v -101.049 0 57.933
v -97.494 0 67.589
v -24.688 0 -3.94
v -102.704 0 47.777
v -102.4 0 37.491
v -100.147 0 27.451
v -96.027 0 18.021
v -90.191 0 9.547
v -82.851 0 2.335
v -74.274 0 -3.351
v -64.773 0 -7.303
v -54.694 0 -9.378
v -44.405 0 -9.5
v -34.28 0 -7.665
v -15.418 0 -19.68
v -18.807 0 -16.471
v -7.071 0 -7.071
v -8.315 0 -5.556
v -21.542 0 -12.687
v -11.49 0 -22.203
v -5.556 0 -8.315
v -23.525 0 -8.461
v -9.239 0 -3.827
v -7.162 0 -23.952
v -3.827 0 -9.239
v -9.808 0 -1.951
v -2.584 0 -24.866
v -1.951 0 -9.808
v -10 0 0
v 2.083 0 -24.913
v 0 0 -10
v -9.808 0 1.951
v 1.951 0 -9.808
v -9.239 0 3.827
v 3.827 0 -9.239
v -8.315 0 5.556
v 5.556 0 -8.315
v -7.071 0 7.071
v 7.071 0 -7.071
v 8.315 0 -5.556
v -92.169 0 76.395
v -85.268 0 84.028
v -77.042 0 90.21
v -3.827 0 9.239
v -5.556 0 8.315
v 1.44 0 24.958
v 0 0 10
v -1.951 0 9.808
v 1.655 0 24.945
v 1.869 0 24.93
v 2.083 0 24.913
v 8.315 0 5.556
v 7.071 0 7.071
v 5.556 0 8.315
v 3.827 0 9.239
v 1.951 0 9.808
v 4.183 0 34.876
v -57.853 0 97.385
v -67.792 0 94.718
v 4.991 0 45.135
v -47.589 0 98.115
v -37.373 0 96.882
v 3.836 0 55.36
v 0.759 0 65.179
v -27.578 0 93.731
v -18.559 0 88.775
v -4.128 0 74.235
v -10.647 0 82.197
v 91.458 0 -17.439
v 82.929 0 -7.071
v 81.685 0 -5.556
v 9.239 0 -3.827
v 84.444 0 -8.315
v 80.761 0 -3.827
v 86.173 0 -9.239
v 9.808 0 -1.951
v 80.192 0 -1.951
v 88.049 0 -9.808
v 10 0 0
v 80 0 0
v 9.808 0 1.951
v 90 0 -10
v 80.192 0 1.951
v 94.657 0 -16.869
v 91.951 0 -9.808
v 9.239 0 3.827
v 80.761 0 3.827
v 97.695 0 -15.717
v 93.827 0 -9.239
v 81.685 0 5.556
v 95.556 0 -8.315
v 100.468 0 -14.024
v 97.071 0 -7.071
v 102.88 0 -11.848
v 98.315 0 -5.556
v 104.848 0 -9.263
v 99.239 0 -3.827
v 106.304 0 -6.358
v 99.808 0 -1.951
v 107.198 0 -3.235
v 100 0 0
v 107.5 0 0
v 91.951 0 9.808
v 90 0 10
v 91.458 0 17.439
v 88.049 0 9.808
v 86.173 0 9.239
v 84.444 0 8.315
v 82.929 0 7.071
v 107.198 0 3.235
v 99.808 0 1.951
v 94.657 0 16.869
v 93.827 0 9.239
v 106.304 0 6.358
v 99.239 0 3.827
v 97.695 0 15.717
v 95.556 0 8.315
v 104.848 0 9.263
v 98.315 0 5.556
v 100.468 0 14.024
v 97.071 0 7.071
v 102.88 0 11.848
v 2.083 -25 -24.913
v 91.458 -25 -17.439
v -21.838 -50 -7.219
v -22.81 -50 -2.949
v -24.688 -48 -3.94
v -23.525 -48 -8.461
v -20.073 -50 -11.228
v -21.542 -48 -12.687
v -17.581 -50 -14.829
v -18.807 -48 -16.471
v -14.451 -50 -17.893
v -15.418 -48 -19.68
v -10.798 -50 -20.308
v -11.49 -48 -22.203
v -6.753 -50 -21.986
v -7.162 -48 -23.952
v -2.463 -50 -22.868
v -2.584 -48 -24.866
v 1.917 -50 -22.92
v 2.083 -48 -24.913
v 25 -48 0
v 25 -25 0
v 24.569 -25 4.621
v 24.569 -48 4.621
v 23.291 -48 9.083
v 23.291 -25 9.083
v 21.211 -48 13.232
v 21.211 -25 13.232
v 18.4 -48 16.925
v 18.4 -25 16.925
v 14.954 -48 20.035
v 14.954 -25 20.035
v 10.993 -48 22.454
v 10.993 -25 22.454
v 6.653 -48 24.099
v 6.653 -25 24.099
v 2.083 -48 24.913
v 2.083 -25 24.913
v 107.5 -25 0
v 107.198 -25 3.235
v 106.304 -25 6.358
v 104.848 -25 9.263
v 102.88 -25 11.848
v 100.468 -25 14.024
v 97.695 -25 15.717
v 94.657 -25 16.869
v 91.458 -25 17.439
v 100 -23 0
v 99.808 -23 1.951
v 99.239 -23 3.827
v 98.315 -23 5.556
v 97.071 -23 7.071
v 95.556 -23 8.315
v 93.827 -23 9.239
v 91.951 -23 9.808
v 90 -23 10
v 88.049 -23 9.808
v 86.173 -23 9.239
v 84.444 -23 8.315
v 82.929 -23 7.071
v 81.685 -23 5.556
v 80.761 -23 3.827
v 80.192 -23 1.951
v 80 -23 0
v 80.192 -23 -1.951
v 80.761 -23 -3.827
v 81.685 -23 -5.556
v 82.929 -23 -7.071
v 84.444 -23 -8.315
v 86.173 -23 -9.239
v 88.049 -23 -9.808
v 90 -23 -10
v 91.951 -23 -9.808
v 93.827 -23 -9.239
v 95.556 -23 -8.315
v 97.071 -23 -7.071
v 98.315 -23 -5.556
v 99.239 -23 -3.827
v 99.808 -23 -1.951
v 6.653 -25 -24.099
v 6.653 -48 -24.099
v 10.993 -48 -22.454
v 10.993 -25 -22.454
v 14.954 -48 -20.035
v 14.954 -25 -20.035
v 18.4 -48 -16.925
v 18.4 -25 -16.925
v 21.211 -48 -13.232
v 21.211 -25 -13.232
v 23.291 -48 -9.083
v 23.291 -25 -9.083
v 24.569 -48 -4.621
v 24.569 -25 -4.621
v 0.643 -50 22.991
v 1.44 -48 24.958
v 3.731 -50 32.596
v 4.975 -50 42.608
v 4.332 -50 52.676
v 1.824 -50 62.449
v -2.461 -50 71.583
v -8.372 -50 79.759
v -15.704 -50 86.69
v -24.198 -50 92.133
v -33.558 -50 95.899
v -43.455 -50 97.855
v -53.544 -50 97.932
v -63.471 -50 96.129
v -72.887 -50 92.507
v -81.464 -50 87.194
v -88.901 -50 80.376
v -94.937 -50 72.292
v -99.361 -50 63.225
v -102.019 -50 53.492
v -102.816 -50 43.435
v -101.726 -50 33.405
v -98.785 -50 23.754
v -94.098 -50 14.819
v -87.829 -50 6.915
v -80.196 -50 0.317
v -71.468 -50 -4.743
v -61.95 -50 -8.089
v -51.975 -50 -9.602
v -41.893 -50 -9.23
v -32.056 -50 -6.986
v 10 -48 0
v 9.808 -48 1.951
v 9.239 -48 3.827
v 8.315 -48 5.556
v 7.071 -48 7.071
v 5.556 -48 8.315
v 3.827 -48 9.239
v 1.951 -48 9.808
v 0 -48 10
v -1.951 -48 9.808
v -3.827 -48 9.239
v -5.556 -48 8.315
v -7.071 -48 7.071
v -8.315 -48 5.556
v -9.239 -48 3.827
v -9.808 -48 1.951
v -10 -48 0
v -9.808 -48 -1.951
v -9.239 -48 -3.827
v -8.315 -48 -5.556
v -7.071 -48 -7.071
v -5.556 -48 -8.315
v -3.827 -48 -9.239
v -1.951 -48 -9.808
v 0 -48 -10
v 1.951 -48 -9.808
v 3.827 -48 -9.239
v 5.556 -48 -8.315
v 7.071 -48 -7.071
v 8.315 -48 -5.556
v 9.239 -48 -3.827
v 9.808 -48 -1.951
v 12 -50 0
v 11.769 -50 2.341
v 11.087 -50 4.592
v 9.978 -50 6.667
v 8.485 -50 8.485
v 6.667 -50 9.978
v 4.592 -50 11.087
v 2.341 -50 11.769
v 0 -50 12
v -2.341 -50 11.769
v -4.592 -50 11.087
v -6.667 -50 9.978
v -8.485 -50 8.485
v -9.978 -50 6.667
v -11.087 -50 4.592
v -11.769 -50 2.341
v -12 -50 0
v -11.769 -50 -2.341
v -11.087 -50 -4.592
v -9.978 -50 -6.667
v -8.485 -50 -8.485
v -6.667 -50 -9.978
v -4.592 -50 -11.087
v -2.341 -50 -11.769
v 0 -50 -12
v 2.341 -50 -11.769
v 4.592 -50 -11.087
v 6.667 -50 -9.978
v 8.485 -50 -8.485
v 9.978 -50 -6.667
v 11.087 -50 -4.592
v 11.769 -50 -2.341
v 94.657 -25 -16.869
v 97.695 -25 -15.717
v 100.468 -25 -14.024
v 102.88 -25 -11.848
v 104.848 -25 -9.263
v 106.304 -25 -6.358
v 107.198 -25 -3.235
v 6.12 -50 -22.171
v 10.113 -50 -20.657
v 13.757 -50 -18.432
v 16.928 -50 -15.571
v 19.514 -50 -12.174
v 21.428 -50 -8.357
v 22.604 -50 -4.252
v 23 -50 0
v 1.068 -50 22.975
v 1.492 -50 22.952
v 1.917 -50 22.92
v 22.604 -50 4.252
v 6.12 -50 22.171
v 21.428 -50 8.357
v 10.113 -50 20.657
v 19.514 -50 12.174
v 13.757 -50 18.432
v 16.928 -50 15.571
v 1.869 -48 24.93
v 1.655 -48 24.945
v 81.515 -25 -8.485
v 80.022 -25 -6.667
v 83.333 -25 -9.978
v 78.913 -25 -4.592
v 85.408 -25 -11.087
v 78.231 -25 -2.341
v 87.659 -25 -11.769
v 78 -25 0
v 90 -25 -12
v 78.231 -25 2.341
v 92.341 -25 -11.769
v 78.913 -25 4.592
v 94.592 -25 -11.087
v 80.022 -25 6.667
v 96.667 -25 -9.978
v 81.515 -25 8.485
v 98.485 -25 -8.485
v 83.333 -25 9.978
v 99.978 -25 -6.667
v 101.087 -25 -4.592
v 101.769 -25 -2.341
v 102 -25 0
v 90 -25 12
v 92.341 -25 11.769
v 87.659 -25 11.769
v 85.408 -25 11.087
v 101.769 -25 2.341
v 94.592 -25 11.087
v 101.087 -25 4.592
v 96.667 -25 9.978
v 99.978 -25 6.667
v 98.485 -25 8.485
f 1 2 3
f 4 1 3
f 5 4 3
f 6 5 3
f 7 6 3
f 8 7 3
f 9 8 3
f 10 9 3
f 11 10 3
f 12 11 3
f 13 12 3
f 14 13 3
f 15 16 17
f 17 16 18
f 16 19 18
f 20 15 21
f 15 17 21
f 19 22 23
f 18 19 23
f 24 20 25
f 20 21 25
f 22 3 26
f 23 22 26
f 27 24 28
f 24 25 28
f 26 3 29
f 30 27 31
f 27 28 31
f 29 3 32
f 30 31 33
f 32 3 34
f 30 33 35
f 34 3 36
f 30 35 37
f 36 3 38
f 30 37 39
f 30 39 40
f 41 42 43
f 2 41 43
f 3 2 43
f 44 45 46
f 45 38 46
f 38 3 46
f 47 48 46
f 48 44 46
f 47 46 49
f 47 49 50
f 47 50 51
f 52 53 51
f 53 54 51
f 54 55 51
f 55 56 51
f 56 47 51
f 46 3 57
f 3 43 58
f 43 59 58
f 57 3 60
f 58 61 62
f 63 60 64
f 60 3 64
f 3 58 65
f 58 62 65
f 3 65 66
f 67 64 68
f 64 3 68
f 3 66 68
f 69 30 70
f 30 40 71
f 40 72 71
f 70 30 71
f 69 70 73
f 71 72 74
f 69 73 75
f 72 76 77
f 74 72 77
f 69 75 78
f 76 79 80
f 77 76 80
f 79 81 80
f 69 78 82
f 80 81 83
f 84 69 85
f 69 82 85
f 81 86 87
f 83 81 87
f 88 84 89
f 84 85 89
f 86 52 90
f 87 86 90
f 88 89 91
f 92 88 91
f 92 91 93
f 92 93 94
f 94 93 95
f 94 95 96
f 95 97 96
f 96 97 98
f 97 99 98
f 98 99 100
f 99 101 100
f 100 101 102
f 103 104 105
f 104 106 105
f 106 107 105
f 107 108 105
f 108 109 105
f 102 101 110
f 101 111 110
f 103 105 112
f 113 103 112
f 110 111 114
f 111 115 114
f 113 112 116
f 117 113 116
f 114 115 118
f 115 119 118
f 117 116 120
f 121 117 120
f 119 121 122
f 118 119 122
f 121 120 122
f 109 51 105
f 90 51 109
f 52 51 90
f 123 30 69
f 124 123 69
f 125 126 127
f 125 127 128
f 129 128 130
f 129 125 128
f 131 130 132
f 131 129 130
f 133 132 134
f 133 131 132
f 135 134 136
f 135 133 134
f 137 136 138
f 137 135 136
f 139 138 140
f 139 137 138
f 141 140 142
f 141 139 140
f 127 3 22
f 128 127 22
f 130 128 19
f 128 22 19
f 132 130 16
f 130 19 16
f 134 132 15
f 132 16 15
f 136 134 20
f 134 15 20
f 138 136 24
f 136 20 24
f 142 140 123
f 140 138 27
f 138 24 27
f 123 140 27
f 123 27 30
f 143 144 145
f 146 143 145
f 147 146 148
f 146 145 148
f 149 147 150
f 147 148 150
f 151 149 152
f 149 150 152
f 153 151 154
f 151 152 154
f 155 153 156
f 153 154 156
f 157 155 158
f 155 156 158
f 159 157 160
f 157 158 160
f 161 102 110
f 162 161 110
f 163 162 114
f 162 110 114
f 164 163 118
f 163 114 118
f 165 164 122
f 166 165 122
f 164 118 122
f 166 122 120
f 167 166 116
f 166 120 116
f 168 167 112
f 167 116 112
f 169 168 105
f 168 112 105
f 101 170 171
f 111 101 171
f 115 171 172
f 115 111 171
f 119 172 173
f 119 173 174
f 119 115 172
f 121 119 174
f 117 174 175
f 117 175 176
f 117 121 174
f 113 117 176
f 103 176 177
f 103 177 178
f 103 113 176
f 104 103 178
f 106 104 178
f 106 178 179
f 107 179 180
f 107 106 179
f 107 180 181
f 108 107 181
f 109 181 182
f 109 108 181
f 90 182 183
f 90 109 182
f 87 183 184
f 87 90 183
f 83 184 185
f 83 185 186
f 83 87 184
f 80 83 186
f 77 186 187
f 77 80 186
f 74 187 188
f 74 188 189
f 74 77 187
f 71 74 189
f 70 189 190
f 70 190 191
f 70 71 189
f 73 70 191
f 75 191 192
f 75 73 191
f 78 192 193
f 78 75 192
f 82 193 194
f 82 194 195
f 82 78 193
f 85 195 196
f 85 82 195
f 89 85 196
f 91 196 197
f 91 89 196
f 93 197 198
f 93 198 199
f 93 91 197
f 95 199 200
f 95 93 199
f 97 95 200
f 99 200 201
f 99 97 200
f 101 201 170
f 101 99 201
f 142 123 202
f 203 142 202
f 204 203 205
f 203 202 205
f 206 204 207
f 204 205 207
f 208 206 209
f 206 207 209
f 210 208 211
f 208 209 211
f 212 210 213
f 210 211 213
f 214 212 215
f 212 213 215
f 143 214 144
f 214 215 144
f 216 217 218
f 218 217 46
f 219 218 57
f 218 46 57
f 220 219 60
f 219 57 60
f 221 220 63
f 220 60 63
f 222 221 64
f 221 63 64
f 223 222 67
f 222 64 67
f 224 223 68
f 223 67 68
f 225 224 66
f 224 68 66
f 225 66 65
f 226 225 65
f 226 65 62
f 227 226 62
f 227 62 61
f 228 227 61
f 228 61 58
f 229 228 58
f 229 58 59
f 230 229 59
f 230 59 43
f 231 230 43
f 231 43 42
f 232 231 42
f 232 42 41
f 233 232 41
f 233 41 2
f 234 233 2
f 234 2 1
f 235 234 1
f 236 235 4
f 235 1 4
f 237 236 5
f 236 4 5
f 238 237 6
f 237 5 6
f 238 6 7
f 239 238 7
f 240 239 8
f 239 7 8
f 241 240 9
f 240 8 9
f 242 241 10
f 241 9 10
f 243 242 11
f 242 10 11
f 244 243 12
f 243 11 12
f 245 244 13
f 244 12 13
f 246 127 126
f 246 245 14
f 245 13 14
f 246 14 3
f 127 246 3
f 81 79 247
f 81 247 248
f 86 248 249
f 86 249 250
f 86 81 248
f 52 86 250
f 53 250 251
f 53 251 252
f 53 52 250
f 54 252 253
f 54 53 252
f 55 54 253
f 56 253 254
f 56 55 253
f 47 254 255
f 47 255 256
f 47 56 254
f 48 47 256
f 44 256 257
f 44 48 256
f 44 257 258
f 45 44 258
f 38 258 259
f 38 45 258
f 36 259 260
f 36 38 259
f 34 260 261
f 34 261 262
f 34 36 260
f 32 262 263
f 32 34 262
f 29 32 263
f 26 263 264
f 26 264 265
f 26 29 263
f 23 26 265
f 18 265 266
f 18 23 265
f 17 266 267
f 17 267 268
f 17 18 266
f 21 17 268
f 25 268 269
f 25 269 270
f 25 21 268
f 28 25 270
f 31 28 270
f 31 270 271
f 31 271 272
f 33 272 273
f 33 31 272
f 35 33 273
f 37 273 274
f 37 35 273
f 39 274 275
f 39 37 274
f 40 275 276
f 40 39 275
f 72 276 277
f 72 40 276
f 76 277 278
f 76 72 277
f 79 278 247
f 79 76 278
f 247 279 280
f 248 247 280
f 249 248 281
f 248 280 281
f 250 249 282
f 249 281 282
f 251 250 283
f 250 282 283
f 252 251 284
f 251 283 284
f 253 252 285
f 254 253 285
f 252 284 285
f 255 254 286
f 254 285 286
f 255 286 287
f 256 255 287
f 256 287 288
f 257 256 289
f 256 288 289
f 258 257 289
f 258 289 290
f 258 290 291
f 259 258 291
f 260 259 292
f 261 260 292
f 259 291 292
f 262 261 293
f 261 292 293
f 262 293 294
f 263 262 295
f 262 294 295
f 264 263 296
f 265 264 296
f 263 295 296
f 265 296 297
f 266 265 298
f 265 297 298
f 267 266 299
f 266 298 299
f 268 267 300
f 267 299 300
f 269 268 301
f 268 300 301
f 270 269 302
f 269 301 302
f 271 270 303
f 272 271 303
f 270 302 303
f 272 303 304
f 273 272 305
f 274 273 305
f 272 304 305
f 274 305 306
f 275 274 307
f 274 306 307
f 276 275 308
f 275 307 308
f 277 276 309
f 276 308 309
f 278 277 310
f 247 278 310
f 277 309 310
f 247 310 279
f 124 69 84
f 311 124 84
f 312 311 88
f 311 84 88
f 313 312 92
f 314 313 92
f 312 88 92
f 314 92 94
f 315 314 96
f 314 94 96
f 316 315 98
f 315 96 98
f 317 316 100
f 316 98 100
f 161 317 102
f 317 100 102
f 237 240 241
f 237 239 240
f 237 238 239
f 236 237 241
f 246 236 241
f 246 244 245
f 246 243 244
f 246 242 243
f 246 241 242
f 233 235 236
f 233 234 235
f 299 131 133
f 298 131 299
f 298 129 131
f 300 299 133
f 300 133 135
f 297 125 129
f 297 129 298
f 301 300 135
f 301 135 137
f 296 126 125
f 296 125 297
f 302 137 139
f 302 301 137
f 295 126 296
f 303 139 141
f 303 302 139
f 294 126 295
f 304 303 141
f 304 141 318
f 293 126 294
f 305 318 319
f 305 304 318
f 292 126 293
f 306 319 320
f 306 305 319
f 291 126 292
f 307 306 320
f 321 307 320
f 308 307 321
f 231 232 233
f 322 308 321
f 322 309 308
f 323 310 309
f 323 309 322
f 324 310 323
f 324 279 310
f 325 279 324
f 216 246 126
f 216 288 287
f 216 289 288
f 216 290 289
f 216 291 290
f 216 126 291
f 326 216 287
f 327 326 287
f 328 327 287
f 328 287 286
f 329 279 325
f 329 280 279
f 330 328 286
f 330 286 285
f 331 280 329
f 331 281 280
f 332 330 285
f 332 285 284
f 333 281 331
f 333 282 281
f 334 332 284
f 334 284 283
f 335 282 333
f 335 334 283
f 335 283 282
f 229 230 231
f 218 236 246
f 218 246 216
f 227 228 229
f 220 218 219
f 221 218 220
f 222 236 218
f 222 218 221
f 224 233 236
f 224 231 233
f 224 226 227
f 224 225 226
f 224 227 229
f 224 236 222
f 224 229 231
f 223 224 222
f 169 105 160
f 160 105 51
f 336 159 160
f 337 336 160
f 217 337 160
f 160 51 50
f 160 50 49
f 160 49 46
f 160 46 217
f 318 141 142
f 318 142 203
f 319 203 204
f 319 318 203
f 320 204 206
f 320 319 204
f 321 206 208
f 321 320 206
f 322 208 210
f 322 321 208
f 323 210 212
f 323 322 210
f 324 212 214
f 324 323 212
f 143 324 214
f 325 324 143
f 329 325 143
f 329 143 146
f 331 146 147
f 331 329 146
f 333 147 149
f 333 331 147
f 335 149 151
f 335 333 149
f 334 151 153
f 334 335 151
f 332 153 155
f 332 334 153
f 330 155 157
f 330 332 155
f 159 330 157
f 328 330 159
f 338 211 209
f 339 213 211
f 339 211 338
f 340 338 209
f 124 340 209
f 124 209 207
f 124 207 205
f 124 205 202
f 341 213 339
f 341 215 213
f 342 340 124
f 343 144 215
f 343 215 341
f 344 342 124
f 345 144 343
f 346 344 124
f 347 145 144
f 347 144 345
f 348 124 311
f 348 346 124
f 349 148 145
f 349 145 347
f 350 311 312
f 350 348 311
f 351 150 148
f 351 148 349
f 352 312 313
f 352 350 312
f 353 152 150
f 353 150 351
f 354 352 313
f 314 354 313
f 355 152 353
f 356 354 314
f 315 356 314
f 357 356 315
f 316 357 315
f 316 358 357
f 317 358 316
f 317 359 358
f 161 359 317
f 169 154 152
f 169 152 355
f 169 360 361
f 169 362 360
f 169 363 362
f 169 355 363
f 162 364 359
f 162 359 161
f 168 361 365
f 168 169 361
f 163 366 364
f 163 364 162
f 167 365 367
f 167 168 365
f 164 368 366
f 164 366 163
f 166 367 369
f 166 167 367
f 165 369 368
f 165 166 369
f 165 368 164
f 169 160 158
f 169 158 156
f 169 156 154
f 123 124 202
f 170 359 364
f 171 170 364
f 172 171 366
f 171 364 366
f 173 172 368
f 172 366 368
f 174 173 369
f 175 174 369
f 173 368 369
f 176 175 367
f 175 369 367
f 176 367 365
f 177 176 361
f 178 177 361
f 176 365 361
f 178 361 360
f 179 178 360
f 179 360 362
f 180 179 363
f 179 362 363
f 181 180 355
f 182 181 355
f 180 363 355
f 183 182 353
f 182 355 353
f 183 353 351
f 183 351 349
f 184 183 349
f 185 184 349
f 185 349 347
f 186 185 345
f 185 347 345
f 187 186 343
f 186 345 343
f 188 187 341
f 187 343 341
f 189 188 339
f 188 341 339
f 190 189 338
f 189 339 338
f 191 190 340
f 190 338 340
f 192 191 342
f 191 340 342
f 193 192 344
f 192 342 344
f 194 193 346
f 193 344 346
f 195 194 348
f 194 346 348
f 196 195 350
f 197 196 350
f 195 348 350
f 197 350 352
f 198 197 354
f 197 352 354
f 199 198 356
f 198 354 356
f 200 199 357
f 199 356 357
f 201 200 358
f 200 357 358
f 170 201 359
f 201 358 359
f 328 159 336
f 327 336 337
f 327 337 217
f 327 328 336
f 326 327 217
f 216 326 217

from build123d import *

# Parameters (mm, degrees)
F0_R     = 10
F1_DEPTH = 25
F2_DEPTH = 50
F3_SIZE  = 2
F4_R     = 53.910386
F6_DEPTH = 50


with BuildPart() as f1:
    # F0 (on Front) → F1 (new body)
    with BuildSketch(Plane.XZ):
        with BuildLine():
            ThreePointArc((2.083333, -24.913043), (18.399502, -16.92508), (25, 0))
            ThreePointArc((25, 0), (18.399502, 16.92508), (2.083333, 24.913043))
            ThreePointArc((2.083333, 24.913043), (-25, 0), (2.083333, -24.913043))
        make_face()
        Circle(F0_R, mode=Mode.SUBTRACT)
        with BuildLine():
            ThreePointArc((2.083333, 24.913043), (18.399502, 16.92508), (25, 0))
            ThreePointArc((25, 0), (18.399502, -16.92508), (2.083333, -24.913043))
            Line((2.083333, -24.913043), (91.458333, -17.43913))
            ThreePointArc((91.458333, -17.43913), (72.5, 0), (91.458333, 17.43913))
            Line((91.458333, 17.43913), (2.083333, 24.913043))
        make_face()
        with BuildLine():
            ThreePointArc((107.5, 0), (102.879651, 11.847556), (91.458333, 17.43913))
            ThreePointArc((91.458333, 17.43913), (72.5, 0), (91.458333, -17.43913))
            ThreePointArc((91.458333, -17.43913), (102.879651, -11.847556), (107.5, 0))
        make_face()
        with Locations((90, 0)):
            Circle(F0_R, mode=Mode.SUBTRACT)
    extrude(amount=F1_DEPTH)

    # F0 (on Front) → F2 (join)
    with BuildSketch(Plane.XZ):
        with BuildLine():
            ThreePointArc((2.083333, -24.913043), (18.399502, -16.92508), (25, 0))
            ThreePointArc((25, 0), (18.399502, 16.92508), (2.083333, 24.913043))
            ThreePointArc((2.083333, 24.913043), (-25, 0), (2.083333, -24.913043))
        make_face()
        Circle(F0_R, mode=Mode.SUBTRACT)
    extrude(amount=F2_DEPTH)

    # F3
    f3_edges = [f1.edges().sort_by_distance(p)[0] for p in [
        (-2.083333, -50, 24.913043),
        (-10, -50, 0),
        (80, -25, 0),
    ]]
    chamfer(f3_edges, length=F3_SIZE)

    # F4 (on Front) → F6 (join)
    with BuildSketch(Plane.XZ):
        with Locations((-48.911478, 44.221319)):
            Circle(F4_R)
    extrude(amount=F6_DEPTH)


solid = f1.part
